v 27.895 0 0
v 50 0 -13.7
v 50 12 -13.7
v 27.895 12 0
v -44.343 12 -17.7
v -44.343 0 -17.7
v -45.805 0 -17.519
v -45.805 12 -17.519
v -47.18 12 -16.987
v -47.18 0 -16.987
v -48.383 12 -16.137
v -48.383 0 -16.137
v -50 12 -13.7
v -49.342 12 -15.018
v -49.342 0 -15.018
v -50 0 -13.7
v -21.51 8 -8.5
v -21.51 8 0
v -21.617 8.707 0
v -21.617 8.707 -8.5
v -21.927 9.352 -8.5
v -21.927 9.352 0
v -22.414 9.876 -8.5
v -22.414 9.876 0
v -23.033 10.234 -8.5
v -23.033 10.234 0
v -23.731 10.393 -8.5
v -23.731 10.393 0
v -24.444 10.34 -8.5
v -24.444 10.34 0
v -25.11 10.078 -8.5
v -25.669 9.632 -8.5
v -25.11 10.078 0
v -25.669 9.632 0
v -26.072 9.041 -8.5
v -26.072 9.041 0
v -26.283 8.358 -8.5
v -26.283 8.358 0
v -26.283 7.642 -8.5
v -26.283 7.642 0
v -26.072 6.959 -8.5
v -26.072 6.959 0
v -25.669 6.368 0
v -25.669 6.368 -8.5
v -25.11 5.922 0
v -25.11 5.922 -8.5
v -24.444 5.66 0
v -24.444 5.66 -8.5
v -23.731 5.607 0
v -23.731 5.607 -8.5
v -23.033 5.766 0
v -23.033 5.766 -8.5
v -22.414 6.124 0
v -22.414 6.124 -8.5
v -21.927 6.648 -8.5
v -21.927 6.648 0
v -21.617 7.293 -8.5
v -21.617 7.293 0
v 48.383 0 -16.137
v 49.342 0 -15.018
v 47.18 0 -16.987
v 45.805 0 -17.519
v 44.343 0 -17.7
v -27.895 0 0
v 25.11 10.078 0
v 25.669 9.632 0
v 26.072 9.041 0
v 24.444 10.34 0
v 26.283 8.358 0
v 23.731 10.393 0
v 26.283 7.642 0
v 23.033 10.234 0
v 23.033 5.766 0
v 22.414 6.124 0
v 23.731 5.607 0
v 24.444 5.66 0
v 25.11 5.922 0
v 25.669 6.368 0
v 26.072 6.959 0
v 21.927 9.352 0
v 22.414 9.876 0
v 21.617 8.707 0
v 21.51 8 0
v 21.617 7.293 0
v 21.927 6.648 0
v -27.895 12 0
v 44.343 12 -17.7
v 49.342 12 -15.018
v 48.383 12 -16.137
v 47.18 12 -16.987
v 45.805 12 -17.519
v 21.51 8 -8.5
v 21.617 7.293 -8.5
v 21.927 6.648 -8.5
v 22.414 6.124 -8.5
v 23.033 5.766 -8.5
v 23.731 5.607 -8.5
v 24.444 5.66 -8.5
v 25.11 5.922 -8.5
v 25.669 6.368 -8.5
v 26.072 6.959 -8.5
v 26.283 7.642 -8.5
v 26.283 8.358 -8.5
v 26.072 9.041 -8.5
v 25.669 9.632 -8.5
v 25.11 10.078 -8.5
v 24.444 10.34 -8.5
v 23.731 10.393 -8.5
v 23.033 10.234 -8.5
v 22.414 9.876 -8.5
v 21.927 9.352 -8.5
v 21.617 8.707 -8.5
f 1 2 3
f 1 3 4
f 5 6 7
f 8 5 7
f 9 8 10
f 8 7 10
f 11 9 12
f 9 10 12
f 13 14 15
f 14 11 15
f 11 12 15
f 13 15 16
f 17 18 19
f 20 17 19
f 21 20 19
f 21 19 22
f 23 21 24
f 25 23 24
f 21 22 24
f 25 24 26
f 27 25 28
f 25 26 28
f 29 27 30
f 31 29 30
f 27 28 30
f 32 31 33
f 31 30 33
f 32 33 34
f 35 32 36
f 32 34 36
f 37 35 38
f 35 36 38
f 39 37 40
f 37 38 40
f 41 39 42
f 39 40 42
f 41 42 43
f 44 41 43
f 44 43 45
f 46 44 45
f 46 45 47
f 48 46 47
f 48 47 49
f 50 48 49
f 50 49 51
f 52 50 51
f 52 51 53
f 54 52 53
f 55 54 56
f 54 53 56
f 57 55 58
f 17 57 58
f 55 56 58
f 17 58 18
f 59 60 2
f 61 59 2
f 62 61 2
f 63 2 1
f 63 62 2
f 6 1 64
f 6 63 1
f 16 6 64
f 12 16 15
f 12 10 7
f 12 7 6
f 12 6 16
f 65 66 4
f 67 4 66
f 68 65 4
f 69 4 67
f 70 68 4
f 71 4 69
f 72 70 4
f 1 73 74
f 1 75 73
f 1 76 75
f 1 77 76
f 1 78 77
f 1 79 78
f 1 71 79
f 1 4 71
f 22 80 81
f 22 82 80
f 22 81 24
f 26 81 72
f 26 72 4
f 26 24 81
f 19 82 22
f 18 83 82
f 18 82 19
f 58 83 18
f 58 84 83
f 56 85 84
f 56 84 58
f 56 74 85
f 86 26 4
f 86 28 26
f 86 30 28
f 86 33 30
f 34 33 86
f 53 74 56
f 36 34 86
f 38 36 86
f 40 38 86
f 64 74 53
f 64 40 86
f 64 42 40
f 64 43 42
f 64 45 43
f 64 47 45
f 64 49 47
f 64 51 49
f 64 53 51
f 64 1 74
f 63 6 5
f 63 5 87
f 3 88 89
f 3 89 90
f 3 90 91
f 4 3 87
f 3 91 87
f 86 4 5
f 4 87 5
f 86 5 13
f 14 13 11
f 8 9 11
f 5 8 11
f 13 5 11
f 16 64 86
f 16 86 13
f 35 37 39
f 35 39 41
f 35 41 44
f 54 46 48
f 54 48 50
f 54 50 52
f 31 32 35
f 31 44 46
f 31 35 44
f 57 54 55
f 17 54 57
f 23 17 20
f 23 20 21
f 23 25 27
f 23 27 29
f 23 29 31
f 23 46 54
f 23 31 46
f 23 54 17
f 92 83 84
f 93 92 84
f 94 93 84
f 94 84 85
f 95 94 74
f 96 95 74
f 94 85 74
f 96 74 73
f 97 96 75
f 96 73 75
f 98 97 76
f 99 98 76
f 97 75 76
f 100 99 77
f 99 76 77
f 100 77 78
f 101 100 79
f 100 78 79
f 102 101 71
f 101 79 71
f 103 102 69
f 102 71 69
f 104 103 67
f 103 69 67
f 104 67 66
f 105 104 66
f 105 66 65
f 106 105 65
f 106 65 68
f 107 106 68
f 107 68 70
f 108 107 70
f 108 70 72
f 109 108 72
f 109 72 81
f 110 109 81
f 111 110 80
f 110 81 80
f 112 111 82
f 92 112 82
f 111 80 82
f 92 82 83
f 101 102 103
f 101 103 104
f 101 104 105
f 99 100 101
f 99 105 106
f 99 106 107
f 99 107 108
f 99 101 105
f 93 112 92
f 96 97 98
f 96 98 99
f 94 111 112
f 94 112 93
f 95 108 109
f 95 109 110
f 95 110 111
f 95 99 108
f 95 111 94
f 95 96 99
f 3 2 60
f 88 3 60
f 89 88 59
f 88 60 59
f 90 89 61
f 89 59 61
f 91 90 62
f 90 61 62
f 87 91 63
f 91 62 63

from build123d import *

# Parameters (mm, degrees)
BOSS_EXTRUDE1_DEPTH = 12
SKETCH3_R           = 2.4
CUT_EXTRUDE1_DEPTH  = 8.5
FILLET1_R           = 6


with BuildPart() as part:
    # Sketch1 → Boss-Extrude1 (new body)
    with BuildSketch(Plane(origin=(0, 0, 0), x_dir=(1, 0, 0), z_dir=(0, 1, 0))):
        Polygon((-50, 17.7), (50, 17.7), (50, 13.7), (27.895, 0), (-27.895, 0), (-50, 13.7), align=None)
    extrude(amount=BOSS_EXTRUDE1_DEPTH)

    # Sketch3 → Cut-Extrude1 (cut)
    with BuildSketch(Plane.XY):
        with Locations((-23.91, 8)):
            Circle(SKETCH3_R)
        with Locations(Location((23.91, 8, 0), (0, 0, 180))):
            Circle(SKETCH3_R)
    extrude(amount=-CUT_EXTRUDE1_DEPTH, mode=Mode.SUBTRACT)

    # Fillet1
    # the kernel refuses this fillet: 6 mm, written as the material it takes off along each edge
    with BuildSketch(Plane(origin=(50, -14.142135624, -17.7), x_dir=(-1, 0, 0), z_dir=(0, 1, 0))) as fillet1_piece_1:
        with BuildLine():
            CenterArc((5.656854249, 6), FILLET1_R, 199.471220634, 70.528779366)
            Line((0, 4), (-0.113137085, 3.96))
            ThreePointArc((-0.113137085, 3.96), (-0.12, 2), (-0.12, 0))
            Line((-0.12, 0), (0, -0.12))
            Line((0, -0.12), (5.656854249, -0.12))
            Line((5.656854249, -0.12), (5.656854249, 0))
        make_face()
    extrude(amount=40.284271247, mode=Mode.SUBTRACT)
    with BuildSketch(Plane(origin=(-50, -14.142135624, -17.7), x_dir=(1, 0, 0), z_dir=(0, 1, 0))) as fillet1_piece_2:
        with BuildLine():
            CenterArc((5.656854249, -6), FILLET1_R, 90, 70.528779366)
            Line((0, -4), (-0.113137085, -3.96))
            ThreePointArc((-0.113137085, -3.96), (-0.12, -2), (-0.12, 0))
            Line((-0.12, 0), (0, 0.12))
            Line((0, 0.12), (5.656854249, 0.12))
            Line((5.656854249, 0.12), (5.656854249, 0))
        make_face()
    extrude(amount=40.284271247, mode=Mode.SUBTRACT)


solid = part.part
